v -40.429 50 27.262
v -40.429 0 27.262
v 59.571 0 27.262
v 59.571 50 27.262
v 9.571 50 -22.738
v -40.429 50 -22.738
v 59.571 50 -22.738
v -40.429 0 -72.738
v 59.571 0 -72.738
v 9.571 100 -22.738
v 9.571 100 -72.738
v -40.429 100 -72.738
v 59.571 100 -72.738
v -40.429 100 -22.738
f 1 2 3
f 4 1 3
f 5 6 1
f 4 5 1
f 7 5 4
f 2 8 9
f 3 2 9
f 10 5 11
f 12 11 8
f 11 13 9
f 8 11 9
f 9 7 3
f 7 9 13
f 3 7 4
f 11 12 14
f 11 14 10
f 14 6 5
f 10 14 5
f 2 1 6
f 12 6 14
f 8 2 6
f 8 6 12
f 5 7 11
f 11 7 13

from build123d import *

# Parameters (mm, degrees)
CROQUIS1_W              = 100
CROQUIS1_H              = 100
SALIENTE_EXTRUIR1_DEPTH = 50
CROQUIS2_W              = 50
CROQUIS2_H              = 50
SALIENTE_EXTRUIR3_DEPTH = 50
SALIENTE_EXTRUIR4_DEPTH = 50


with BuildPart() as part:
    # Croquis1 → Saliente-Extruir1 (new body)
    with BuildSketch(Plane(origin=(0, 0, 0), x_dir=(1, 0, 0), z_dir=(0, 1, 0))):
        with Locations((9.571472252, 22.737819026)):
            Rectangle(CROQUIS1_W, CROQUIS1_H)
    extrude(amount=SALIENTE_EXTRUIR1_DEPTH)

    # Croquis2 → Saliente-Extruir3 (add)
    with BuildSketch(Plane(origin=(0, 50, 0), x_dir=(1, 0, 0), z_dir=(0, 1, 0))):
        with Locations((-15.428527748, 47.737819026)):
            Rectangle(CROQUIS2_W, CROQUIS2_H)
    extrude(amount=SALIENTE_EXTRUIR3_DEPTH)

    # Croquis3 → Saliente-Extruir4 (add)
    with BuildSketch(Plane(origin=(59.571472252, 0, 0), x_dir=(0, 0, -1), z_dir=(1, 0, 0))):
        Polygon((22.737819026, 50), (72.737819026, 100), (72.737819026, 50), align=None)
    extrude(amount=-SALIENTE_EXTRUIR4_DEPTH)


solid = part.part
